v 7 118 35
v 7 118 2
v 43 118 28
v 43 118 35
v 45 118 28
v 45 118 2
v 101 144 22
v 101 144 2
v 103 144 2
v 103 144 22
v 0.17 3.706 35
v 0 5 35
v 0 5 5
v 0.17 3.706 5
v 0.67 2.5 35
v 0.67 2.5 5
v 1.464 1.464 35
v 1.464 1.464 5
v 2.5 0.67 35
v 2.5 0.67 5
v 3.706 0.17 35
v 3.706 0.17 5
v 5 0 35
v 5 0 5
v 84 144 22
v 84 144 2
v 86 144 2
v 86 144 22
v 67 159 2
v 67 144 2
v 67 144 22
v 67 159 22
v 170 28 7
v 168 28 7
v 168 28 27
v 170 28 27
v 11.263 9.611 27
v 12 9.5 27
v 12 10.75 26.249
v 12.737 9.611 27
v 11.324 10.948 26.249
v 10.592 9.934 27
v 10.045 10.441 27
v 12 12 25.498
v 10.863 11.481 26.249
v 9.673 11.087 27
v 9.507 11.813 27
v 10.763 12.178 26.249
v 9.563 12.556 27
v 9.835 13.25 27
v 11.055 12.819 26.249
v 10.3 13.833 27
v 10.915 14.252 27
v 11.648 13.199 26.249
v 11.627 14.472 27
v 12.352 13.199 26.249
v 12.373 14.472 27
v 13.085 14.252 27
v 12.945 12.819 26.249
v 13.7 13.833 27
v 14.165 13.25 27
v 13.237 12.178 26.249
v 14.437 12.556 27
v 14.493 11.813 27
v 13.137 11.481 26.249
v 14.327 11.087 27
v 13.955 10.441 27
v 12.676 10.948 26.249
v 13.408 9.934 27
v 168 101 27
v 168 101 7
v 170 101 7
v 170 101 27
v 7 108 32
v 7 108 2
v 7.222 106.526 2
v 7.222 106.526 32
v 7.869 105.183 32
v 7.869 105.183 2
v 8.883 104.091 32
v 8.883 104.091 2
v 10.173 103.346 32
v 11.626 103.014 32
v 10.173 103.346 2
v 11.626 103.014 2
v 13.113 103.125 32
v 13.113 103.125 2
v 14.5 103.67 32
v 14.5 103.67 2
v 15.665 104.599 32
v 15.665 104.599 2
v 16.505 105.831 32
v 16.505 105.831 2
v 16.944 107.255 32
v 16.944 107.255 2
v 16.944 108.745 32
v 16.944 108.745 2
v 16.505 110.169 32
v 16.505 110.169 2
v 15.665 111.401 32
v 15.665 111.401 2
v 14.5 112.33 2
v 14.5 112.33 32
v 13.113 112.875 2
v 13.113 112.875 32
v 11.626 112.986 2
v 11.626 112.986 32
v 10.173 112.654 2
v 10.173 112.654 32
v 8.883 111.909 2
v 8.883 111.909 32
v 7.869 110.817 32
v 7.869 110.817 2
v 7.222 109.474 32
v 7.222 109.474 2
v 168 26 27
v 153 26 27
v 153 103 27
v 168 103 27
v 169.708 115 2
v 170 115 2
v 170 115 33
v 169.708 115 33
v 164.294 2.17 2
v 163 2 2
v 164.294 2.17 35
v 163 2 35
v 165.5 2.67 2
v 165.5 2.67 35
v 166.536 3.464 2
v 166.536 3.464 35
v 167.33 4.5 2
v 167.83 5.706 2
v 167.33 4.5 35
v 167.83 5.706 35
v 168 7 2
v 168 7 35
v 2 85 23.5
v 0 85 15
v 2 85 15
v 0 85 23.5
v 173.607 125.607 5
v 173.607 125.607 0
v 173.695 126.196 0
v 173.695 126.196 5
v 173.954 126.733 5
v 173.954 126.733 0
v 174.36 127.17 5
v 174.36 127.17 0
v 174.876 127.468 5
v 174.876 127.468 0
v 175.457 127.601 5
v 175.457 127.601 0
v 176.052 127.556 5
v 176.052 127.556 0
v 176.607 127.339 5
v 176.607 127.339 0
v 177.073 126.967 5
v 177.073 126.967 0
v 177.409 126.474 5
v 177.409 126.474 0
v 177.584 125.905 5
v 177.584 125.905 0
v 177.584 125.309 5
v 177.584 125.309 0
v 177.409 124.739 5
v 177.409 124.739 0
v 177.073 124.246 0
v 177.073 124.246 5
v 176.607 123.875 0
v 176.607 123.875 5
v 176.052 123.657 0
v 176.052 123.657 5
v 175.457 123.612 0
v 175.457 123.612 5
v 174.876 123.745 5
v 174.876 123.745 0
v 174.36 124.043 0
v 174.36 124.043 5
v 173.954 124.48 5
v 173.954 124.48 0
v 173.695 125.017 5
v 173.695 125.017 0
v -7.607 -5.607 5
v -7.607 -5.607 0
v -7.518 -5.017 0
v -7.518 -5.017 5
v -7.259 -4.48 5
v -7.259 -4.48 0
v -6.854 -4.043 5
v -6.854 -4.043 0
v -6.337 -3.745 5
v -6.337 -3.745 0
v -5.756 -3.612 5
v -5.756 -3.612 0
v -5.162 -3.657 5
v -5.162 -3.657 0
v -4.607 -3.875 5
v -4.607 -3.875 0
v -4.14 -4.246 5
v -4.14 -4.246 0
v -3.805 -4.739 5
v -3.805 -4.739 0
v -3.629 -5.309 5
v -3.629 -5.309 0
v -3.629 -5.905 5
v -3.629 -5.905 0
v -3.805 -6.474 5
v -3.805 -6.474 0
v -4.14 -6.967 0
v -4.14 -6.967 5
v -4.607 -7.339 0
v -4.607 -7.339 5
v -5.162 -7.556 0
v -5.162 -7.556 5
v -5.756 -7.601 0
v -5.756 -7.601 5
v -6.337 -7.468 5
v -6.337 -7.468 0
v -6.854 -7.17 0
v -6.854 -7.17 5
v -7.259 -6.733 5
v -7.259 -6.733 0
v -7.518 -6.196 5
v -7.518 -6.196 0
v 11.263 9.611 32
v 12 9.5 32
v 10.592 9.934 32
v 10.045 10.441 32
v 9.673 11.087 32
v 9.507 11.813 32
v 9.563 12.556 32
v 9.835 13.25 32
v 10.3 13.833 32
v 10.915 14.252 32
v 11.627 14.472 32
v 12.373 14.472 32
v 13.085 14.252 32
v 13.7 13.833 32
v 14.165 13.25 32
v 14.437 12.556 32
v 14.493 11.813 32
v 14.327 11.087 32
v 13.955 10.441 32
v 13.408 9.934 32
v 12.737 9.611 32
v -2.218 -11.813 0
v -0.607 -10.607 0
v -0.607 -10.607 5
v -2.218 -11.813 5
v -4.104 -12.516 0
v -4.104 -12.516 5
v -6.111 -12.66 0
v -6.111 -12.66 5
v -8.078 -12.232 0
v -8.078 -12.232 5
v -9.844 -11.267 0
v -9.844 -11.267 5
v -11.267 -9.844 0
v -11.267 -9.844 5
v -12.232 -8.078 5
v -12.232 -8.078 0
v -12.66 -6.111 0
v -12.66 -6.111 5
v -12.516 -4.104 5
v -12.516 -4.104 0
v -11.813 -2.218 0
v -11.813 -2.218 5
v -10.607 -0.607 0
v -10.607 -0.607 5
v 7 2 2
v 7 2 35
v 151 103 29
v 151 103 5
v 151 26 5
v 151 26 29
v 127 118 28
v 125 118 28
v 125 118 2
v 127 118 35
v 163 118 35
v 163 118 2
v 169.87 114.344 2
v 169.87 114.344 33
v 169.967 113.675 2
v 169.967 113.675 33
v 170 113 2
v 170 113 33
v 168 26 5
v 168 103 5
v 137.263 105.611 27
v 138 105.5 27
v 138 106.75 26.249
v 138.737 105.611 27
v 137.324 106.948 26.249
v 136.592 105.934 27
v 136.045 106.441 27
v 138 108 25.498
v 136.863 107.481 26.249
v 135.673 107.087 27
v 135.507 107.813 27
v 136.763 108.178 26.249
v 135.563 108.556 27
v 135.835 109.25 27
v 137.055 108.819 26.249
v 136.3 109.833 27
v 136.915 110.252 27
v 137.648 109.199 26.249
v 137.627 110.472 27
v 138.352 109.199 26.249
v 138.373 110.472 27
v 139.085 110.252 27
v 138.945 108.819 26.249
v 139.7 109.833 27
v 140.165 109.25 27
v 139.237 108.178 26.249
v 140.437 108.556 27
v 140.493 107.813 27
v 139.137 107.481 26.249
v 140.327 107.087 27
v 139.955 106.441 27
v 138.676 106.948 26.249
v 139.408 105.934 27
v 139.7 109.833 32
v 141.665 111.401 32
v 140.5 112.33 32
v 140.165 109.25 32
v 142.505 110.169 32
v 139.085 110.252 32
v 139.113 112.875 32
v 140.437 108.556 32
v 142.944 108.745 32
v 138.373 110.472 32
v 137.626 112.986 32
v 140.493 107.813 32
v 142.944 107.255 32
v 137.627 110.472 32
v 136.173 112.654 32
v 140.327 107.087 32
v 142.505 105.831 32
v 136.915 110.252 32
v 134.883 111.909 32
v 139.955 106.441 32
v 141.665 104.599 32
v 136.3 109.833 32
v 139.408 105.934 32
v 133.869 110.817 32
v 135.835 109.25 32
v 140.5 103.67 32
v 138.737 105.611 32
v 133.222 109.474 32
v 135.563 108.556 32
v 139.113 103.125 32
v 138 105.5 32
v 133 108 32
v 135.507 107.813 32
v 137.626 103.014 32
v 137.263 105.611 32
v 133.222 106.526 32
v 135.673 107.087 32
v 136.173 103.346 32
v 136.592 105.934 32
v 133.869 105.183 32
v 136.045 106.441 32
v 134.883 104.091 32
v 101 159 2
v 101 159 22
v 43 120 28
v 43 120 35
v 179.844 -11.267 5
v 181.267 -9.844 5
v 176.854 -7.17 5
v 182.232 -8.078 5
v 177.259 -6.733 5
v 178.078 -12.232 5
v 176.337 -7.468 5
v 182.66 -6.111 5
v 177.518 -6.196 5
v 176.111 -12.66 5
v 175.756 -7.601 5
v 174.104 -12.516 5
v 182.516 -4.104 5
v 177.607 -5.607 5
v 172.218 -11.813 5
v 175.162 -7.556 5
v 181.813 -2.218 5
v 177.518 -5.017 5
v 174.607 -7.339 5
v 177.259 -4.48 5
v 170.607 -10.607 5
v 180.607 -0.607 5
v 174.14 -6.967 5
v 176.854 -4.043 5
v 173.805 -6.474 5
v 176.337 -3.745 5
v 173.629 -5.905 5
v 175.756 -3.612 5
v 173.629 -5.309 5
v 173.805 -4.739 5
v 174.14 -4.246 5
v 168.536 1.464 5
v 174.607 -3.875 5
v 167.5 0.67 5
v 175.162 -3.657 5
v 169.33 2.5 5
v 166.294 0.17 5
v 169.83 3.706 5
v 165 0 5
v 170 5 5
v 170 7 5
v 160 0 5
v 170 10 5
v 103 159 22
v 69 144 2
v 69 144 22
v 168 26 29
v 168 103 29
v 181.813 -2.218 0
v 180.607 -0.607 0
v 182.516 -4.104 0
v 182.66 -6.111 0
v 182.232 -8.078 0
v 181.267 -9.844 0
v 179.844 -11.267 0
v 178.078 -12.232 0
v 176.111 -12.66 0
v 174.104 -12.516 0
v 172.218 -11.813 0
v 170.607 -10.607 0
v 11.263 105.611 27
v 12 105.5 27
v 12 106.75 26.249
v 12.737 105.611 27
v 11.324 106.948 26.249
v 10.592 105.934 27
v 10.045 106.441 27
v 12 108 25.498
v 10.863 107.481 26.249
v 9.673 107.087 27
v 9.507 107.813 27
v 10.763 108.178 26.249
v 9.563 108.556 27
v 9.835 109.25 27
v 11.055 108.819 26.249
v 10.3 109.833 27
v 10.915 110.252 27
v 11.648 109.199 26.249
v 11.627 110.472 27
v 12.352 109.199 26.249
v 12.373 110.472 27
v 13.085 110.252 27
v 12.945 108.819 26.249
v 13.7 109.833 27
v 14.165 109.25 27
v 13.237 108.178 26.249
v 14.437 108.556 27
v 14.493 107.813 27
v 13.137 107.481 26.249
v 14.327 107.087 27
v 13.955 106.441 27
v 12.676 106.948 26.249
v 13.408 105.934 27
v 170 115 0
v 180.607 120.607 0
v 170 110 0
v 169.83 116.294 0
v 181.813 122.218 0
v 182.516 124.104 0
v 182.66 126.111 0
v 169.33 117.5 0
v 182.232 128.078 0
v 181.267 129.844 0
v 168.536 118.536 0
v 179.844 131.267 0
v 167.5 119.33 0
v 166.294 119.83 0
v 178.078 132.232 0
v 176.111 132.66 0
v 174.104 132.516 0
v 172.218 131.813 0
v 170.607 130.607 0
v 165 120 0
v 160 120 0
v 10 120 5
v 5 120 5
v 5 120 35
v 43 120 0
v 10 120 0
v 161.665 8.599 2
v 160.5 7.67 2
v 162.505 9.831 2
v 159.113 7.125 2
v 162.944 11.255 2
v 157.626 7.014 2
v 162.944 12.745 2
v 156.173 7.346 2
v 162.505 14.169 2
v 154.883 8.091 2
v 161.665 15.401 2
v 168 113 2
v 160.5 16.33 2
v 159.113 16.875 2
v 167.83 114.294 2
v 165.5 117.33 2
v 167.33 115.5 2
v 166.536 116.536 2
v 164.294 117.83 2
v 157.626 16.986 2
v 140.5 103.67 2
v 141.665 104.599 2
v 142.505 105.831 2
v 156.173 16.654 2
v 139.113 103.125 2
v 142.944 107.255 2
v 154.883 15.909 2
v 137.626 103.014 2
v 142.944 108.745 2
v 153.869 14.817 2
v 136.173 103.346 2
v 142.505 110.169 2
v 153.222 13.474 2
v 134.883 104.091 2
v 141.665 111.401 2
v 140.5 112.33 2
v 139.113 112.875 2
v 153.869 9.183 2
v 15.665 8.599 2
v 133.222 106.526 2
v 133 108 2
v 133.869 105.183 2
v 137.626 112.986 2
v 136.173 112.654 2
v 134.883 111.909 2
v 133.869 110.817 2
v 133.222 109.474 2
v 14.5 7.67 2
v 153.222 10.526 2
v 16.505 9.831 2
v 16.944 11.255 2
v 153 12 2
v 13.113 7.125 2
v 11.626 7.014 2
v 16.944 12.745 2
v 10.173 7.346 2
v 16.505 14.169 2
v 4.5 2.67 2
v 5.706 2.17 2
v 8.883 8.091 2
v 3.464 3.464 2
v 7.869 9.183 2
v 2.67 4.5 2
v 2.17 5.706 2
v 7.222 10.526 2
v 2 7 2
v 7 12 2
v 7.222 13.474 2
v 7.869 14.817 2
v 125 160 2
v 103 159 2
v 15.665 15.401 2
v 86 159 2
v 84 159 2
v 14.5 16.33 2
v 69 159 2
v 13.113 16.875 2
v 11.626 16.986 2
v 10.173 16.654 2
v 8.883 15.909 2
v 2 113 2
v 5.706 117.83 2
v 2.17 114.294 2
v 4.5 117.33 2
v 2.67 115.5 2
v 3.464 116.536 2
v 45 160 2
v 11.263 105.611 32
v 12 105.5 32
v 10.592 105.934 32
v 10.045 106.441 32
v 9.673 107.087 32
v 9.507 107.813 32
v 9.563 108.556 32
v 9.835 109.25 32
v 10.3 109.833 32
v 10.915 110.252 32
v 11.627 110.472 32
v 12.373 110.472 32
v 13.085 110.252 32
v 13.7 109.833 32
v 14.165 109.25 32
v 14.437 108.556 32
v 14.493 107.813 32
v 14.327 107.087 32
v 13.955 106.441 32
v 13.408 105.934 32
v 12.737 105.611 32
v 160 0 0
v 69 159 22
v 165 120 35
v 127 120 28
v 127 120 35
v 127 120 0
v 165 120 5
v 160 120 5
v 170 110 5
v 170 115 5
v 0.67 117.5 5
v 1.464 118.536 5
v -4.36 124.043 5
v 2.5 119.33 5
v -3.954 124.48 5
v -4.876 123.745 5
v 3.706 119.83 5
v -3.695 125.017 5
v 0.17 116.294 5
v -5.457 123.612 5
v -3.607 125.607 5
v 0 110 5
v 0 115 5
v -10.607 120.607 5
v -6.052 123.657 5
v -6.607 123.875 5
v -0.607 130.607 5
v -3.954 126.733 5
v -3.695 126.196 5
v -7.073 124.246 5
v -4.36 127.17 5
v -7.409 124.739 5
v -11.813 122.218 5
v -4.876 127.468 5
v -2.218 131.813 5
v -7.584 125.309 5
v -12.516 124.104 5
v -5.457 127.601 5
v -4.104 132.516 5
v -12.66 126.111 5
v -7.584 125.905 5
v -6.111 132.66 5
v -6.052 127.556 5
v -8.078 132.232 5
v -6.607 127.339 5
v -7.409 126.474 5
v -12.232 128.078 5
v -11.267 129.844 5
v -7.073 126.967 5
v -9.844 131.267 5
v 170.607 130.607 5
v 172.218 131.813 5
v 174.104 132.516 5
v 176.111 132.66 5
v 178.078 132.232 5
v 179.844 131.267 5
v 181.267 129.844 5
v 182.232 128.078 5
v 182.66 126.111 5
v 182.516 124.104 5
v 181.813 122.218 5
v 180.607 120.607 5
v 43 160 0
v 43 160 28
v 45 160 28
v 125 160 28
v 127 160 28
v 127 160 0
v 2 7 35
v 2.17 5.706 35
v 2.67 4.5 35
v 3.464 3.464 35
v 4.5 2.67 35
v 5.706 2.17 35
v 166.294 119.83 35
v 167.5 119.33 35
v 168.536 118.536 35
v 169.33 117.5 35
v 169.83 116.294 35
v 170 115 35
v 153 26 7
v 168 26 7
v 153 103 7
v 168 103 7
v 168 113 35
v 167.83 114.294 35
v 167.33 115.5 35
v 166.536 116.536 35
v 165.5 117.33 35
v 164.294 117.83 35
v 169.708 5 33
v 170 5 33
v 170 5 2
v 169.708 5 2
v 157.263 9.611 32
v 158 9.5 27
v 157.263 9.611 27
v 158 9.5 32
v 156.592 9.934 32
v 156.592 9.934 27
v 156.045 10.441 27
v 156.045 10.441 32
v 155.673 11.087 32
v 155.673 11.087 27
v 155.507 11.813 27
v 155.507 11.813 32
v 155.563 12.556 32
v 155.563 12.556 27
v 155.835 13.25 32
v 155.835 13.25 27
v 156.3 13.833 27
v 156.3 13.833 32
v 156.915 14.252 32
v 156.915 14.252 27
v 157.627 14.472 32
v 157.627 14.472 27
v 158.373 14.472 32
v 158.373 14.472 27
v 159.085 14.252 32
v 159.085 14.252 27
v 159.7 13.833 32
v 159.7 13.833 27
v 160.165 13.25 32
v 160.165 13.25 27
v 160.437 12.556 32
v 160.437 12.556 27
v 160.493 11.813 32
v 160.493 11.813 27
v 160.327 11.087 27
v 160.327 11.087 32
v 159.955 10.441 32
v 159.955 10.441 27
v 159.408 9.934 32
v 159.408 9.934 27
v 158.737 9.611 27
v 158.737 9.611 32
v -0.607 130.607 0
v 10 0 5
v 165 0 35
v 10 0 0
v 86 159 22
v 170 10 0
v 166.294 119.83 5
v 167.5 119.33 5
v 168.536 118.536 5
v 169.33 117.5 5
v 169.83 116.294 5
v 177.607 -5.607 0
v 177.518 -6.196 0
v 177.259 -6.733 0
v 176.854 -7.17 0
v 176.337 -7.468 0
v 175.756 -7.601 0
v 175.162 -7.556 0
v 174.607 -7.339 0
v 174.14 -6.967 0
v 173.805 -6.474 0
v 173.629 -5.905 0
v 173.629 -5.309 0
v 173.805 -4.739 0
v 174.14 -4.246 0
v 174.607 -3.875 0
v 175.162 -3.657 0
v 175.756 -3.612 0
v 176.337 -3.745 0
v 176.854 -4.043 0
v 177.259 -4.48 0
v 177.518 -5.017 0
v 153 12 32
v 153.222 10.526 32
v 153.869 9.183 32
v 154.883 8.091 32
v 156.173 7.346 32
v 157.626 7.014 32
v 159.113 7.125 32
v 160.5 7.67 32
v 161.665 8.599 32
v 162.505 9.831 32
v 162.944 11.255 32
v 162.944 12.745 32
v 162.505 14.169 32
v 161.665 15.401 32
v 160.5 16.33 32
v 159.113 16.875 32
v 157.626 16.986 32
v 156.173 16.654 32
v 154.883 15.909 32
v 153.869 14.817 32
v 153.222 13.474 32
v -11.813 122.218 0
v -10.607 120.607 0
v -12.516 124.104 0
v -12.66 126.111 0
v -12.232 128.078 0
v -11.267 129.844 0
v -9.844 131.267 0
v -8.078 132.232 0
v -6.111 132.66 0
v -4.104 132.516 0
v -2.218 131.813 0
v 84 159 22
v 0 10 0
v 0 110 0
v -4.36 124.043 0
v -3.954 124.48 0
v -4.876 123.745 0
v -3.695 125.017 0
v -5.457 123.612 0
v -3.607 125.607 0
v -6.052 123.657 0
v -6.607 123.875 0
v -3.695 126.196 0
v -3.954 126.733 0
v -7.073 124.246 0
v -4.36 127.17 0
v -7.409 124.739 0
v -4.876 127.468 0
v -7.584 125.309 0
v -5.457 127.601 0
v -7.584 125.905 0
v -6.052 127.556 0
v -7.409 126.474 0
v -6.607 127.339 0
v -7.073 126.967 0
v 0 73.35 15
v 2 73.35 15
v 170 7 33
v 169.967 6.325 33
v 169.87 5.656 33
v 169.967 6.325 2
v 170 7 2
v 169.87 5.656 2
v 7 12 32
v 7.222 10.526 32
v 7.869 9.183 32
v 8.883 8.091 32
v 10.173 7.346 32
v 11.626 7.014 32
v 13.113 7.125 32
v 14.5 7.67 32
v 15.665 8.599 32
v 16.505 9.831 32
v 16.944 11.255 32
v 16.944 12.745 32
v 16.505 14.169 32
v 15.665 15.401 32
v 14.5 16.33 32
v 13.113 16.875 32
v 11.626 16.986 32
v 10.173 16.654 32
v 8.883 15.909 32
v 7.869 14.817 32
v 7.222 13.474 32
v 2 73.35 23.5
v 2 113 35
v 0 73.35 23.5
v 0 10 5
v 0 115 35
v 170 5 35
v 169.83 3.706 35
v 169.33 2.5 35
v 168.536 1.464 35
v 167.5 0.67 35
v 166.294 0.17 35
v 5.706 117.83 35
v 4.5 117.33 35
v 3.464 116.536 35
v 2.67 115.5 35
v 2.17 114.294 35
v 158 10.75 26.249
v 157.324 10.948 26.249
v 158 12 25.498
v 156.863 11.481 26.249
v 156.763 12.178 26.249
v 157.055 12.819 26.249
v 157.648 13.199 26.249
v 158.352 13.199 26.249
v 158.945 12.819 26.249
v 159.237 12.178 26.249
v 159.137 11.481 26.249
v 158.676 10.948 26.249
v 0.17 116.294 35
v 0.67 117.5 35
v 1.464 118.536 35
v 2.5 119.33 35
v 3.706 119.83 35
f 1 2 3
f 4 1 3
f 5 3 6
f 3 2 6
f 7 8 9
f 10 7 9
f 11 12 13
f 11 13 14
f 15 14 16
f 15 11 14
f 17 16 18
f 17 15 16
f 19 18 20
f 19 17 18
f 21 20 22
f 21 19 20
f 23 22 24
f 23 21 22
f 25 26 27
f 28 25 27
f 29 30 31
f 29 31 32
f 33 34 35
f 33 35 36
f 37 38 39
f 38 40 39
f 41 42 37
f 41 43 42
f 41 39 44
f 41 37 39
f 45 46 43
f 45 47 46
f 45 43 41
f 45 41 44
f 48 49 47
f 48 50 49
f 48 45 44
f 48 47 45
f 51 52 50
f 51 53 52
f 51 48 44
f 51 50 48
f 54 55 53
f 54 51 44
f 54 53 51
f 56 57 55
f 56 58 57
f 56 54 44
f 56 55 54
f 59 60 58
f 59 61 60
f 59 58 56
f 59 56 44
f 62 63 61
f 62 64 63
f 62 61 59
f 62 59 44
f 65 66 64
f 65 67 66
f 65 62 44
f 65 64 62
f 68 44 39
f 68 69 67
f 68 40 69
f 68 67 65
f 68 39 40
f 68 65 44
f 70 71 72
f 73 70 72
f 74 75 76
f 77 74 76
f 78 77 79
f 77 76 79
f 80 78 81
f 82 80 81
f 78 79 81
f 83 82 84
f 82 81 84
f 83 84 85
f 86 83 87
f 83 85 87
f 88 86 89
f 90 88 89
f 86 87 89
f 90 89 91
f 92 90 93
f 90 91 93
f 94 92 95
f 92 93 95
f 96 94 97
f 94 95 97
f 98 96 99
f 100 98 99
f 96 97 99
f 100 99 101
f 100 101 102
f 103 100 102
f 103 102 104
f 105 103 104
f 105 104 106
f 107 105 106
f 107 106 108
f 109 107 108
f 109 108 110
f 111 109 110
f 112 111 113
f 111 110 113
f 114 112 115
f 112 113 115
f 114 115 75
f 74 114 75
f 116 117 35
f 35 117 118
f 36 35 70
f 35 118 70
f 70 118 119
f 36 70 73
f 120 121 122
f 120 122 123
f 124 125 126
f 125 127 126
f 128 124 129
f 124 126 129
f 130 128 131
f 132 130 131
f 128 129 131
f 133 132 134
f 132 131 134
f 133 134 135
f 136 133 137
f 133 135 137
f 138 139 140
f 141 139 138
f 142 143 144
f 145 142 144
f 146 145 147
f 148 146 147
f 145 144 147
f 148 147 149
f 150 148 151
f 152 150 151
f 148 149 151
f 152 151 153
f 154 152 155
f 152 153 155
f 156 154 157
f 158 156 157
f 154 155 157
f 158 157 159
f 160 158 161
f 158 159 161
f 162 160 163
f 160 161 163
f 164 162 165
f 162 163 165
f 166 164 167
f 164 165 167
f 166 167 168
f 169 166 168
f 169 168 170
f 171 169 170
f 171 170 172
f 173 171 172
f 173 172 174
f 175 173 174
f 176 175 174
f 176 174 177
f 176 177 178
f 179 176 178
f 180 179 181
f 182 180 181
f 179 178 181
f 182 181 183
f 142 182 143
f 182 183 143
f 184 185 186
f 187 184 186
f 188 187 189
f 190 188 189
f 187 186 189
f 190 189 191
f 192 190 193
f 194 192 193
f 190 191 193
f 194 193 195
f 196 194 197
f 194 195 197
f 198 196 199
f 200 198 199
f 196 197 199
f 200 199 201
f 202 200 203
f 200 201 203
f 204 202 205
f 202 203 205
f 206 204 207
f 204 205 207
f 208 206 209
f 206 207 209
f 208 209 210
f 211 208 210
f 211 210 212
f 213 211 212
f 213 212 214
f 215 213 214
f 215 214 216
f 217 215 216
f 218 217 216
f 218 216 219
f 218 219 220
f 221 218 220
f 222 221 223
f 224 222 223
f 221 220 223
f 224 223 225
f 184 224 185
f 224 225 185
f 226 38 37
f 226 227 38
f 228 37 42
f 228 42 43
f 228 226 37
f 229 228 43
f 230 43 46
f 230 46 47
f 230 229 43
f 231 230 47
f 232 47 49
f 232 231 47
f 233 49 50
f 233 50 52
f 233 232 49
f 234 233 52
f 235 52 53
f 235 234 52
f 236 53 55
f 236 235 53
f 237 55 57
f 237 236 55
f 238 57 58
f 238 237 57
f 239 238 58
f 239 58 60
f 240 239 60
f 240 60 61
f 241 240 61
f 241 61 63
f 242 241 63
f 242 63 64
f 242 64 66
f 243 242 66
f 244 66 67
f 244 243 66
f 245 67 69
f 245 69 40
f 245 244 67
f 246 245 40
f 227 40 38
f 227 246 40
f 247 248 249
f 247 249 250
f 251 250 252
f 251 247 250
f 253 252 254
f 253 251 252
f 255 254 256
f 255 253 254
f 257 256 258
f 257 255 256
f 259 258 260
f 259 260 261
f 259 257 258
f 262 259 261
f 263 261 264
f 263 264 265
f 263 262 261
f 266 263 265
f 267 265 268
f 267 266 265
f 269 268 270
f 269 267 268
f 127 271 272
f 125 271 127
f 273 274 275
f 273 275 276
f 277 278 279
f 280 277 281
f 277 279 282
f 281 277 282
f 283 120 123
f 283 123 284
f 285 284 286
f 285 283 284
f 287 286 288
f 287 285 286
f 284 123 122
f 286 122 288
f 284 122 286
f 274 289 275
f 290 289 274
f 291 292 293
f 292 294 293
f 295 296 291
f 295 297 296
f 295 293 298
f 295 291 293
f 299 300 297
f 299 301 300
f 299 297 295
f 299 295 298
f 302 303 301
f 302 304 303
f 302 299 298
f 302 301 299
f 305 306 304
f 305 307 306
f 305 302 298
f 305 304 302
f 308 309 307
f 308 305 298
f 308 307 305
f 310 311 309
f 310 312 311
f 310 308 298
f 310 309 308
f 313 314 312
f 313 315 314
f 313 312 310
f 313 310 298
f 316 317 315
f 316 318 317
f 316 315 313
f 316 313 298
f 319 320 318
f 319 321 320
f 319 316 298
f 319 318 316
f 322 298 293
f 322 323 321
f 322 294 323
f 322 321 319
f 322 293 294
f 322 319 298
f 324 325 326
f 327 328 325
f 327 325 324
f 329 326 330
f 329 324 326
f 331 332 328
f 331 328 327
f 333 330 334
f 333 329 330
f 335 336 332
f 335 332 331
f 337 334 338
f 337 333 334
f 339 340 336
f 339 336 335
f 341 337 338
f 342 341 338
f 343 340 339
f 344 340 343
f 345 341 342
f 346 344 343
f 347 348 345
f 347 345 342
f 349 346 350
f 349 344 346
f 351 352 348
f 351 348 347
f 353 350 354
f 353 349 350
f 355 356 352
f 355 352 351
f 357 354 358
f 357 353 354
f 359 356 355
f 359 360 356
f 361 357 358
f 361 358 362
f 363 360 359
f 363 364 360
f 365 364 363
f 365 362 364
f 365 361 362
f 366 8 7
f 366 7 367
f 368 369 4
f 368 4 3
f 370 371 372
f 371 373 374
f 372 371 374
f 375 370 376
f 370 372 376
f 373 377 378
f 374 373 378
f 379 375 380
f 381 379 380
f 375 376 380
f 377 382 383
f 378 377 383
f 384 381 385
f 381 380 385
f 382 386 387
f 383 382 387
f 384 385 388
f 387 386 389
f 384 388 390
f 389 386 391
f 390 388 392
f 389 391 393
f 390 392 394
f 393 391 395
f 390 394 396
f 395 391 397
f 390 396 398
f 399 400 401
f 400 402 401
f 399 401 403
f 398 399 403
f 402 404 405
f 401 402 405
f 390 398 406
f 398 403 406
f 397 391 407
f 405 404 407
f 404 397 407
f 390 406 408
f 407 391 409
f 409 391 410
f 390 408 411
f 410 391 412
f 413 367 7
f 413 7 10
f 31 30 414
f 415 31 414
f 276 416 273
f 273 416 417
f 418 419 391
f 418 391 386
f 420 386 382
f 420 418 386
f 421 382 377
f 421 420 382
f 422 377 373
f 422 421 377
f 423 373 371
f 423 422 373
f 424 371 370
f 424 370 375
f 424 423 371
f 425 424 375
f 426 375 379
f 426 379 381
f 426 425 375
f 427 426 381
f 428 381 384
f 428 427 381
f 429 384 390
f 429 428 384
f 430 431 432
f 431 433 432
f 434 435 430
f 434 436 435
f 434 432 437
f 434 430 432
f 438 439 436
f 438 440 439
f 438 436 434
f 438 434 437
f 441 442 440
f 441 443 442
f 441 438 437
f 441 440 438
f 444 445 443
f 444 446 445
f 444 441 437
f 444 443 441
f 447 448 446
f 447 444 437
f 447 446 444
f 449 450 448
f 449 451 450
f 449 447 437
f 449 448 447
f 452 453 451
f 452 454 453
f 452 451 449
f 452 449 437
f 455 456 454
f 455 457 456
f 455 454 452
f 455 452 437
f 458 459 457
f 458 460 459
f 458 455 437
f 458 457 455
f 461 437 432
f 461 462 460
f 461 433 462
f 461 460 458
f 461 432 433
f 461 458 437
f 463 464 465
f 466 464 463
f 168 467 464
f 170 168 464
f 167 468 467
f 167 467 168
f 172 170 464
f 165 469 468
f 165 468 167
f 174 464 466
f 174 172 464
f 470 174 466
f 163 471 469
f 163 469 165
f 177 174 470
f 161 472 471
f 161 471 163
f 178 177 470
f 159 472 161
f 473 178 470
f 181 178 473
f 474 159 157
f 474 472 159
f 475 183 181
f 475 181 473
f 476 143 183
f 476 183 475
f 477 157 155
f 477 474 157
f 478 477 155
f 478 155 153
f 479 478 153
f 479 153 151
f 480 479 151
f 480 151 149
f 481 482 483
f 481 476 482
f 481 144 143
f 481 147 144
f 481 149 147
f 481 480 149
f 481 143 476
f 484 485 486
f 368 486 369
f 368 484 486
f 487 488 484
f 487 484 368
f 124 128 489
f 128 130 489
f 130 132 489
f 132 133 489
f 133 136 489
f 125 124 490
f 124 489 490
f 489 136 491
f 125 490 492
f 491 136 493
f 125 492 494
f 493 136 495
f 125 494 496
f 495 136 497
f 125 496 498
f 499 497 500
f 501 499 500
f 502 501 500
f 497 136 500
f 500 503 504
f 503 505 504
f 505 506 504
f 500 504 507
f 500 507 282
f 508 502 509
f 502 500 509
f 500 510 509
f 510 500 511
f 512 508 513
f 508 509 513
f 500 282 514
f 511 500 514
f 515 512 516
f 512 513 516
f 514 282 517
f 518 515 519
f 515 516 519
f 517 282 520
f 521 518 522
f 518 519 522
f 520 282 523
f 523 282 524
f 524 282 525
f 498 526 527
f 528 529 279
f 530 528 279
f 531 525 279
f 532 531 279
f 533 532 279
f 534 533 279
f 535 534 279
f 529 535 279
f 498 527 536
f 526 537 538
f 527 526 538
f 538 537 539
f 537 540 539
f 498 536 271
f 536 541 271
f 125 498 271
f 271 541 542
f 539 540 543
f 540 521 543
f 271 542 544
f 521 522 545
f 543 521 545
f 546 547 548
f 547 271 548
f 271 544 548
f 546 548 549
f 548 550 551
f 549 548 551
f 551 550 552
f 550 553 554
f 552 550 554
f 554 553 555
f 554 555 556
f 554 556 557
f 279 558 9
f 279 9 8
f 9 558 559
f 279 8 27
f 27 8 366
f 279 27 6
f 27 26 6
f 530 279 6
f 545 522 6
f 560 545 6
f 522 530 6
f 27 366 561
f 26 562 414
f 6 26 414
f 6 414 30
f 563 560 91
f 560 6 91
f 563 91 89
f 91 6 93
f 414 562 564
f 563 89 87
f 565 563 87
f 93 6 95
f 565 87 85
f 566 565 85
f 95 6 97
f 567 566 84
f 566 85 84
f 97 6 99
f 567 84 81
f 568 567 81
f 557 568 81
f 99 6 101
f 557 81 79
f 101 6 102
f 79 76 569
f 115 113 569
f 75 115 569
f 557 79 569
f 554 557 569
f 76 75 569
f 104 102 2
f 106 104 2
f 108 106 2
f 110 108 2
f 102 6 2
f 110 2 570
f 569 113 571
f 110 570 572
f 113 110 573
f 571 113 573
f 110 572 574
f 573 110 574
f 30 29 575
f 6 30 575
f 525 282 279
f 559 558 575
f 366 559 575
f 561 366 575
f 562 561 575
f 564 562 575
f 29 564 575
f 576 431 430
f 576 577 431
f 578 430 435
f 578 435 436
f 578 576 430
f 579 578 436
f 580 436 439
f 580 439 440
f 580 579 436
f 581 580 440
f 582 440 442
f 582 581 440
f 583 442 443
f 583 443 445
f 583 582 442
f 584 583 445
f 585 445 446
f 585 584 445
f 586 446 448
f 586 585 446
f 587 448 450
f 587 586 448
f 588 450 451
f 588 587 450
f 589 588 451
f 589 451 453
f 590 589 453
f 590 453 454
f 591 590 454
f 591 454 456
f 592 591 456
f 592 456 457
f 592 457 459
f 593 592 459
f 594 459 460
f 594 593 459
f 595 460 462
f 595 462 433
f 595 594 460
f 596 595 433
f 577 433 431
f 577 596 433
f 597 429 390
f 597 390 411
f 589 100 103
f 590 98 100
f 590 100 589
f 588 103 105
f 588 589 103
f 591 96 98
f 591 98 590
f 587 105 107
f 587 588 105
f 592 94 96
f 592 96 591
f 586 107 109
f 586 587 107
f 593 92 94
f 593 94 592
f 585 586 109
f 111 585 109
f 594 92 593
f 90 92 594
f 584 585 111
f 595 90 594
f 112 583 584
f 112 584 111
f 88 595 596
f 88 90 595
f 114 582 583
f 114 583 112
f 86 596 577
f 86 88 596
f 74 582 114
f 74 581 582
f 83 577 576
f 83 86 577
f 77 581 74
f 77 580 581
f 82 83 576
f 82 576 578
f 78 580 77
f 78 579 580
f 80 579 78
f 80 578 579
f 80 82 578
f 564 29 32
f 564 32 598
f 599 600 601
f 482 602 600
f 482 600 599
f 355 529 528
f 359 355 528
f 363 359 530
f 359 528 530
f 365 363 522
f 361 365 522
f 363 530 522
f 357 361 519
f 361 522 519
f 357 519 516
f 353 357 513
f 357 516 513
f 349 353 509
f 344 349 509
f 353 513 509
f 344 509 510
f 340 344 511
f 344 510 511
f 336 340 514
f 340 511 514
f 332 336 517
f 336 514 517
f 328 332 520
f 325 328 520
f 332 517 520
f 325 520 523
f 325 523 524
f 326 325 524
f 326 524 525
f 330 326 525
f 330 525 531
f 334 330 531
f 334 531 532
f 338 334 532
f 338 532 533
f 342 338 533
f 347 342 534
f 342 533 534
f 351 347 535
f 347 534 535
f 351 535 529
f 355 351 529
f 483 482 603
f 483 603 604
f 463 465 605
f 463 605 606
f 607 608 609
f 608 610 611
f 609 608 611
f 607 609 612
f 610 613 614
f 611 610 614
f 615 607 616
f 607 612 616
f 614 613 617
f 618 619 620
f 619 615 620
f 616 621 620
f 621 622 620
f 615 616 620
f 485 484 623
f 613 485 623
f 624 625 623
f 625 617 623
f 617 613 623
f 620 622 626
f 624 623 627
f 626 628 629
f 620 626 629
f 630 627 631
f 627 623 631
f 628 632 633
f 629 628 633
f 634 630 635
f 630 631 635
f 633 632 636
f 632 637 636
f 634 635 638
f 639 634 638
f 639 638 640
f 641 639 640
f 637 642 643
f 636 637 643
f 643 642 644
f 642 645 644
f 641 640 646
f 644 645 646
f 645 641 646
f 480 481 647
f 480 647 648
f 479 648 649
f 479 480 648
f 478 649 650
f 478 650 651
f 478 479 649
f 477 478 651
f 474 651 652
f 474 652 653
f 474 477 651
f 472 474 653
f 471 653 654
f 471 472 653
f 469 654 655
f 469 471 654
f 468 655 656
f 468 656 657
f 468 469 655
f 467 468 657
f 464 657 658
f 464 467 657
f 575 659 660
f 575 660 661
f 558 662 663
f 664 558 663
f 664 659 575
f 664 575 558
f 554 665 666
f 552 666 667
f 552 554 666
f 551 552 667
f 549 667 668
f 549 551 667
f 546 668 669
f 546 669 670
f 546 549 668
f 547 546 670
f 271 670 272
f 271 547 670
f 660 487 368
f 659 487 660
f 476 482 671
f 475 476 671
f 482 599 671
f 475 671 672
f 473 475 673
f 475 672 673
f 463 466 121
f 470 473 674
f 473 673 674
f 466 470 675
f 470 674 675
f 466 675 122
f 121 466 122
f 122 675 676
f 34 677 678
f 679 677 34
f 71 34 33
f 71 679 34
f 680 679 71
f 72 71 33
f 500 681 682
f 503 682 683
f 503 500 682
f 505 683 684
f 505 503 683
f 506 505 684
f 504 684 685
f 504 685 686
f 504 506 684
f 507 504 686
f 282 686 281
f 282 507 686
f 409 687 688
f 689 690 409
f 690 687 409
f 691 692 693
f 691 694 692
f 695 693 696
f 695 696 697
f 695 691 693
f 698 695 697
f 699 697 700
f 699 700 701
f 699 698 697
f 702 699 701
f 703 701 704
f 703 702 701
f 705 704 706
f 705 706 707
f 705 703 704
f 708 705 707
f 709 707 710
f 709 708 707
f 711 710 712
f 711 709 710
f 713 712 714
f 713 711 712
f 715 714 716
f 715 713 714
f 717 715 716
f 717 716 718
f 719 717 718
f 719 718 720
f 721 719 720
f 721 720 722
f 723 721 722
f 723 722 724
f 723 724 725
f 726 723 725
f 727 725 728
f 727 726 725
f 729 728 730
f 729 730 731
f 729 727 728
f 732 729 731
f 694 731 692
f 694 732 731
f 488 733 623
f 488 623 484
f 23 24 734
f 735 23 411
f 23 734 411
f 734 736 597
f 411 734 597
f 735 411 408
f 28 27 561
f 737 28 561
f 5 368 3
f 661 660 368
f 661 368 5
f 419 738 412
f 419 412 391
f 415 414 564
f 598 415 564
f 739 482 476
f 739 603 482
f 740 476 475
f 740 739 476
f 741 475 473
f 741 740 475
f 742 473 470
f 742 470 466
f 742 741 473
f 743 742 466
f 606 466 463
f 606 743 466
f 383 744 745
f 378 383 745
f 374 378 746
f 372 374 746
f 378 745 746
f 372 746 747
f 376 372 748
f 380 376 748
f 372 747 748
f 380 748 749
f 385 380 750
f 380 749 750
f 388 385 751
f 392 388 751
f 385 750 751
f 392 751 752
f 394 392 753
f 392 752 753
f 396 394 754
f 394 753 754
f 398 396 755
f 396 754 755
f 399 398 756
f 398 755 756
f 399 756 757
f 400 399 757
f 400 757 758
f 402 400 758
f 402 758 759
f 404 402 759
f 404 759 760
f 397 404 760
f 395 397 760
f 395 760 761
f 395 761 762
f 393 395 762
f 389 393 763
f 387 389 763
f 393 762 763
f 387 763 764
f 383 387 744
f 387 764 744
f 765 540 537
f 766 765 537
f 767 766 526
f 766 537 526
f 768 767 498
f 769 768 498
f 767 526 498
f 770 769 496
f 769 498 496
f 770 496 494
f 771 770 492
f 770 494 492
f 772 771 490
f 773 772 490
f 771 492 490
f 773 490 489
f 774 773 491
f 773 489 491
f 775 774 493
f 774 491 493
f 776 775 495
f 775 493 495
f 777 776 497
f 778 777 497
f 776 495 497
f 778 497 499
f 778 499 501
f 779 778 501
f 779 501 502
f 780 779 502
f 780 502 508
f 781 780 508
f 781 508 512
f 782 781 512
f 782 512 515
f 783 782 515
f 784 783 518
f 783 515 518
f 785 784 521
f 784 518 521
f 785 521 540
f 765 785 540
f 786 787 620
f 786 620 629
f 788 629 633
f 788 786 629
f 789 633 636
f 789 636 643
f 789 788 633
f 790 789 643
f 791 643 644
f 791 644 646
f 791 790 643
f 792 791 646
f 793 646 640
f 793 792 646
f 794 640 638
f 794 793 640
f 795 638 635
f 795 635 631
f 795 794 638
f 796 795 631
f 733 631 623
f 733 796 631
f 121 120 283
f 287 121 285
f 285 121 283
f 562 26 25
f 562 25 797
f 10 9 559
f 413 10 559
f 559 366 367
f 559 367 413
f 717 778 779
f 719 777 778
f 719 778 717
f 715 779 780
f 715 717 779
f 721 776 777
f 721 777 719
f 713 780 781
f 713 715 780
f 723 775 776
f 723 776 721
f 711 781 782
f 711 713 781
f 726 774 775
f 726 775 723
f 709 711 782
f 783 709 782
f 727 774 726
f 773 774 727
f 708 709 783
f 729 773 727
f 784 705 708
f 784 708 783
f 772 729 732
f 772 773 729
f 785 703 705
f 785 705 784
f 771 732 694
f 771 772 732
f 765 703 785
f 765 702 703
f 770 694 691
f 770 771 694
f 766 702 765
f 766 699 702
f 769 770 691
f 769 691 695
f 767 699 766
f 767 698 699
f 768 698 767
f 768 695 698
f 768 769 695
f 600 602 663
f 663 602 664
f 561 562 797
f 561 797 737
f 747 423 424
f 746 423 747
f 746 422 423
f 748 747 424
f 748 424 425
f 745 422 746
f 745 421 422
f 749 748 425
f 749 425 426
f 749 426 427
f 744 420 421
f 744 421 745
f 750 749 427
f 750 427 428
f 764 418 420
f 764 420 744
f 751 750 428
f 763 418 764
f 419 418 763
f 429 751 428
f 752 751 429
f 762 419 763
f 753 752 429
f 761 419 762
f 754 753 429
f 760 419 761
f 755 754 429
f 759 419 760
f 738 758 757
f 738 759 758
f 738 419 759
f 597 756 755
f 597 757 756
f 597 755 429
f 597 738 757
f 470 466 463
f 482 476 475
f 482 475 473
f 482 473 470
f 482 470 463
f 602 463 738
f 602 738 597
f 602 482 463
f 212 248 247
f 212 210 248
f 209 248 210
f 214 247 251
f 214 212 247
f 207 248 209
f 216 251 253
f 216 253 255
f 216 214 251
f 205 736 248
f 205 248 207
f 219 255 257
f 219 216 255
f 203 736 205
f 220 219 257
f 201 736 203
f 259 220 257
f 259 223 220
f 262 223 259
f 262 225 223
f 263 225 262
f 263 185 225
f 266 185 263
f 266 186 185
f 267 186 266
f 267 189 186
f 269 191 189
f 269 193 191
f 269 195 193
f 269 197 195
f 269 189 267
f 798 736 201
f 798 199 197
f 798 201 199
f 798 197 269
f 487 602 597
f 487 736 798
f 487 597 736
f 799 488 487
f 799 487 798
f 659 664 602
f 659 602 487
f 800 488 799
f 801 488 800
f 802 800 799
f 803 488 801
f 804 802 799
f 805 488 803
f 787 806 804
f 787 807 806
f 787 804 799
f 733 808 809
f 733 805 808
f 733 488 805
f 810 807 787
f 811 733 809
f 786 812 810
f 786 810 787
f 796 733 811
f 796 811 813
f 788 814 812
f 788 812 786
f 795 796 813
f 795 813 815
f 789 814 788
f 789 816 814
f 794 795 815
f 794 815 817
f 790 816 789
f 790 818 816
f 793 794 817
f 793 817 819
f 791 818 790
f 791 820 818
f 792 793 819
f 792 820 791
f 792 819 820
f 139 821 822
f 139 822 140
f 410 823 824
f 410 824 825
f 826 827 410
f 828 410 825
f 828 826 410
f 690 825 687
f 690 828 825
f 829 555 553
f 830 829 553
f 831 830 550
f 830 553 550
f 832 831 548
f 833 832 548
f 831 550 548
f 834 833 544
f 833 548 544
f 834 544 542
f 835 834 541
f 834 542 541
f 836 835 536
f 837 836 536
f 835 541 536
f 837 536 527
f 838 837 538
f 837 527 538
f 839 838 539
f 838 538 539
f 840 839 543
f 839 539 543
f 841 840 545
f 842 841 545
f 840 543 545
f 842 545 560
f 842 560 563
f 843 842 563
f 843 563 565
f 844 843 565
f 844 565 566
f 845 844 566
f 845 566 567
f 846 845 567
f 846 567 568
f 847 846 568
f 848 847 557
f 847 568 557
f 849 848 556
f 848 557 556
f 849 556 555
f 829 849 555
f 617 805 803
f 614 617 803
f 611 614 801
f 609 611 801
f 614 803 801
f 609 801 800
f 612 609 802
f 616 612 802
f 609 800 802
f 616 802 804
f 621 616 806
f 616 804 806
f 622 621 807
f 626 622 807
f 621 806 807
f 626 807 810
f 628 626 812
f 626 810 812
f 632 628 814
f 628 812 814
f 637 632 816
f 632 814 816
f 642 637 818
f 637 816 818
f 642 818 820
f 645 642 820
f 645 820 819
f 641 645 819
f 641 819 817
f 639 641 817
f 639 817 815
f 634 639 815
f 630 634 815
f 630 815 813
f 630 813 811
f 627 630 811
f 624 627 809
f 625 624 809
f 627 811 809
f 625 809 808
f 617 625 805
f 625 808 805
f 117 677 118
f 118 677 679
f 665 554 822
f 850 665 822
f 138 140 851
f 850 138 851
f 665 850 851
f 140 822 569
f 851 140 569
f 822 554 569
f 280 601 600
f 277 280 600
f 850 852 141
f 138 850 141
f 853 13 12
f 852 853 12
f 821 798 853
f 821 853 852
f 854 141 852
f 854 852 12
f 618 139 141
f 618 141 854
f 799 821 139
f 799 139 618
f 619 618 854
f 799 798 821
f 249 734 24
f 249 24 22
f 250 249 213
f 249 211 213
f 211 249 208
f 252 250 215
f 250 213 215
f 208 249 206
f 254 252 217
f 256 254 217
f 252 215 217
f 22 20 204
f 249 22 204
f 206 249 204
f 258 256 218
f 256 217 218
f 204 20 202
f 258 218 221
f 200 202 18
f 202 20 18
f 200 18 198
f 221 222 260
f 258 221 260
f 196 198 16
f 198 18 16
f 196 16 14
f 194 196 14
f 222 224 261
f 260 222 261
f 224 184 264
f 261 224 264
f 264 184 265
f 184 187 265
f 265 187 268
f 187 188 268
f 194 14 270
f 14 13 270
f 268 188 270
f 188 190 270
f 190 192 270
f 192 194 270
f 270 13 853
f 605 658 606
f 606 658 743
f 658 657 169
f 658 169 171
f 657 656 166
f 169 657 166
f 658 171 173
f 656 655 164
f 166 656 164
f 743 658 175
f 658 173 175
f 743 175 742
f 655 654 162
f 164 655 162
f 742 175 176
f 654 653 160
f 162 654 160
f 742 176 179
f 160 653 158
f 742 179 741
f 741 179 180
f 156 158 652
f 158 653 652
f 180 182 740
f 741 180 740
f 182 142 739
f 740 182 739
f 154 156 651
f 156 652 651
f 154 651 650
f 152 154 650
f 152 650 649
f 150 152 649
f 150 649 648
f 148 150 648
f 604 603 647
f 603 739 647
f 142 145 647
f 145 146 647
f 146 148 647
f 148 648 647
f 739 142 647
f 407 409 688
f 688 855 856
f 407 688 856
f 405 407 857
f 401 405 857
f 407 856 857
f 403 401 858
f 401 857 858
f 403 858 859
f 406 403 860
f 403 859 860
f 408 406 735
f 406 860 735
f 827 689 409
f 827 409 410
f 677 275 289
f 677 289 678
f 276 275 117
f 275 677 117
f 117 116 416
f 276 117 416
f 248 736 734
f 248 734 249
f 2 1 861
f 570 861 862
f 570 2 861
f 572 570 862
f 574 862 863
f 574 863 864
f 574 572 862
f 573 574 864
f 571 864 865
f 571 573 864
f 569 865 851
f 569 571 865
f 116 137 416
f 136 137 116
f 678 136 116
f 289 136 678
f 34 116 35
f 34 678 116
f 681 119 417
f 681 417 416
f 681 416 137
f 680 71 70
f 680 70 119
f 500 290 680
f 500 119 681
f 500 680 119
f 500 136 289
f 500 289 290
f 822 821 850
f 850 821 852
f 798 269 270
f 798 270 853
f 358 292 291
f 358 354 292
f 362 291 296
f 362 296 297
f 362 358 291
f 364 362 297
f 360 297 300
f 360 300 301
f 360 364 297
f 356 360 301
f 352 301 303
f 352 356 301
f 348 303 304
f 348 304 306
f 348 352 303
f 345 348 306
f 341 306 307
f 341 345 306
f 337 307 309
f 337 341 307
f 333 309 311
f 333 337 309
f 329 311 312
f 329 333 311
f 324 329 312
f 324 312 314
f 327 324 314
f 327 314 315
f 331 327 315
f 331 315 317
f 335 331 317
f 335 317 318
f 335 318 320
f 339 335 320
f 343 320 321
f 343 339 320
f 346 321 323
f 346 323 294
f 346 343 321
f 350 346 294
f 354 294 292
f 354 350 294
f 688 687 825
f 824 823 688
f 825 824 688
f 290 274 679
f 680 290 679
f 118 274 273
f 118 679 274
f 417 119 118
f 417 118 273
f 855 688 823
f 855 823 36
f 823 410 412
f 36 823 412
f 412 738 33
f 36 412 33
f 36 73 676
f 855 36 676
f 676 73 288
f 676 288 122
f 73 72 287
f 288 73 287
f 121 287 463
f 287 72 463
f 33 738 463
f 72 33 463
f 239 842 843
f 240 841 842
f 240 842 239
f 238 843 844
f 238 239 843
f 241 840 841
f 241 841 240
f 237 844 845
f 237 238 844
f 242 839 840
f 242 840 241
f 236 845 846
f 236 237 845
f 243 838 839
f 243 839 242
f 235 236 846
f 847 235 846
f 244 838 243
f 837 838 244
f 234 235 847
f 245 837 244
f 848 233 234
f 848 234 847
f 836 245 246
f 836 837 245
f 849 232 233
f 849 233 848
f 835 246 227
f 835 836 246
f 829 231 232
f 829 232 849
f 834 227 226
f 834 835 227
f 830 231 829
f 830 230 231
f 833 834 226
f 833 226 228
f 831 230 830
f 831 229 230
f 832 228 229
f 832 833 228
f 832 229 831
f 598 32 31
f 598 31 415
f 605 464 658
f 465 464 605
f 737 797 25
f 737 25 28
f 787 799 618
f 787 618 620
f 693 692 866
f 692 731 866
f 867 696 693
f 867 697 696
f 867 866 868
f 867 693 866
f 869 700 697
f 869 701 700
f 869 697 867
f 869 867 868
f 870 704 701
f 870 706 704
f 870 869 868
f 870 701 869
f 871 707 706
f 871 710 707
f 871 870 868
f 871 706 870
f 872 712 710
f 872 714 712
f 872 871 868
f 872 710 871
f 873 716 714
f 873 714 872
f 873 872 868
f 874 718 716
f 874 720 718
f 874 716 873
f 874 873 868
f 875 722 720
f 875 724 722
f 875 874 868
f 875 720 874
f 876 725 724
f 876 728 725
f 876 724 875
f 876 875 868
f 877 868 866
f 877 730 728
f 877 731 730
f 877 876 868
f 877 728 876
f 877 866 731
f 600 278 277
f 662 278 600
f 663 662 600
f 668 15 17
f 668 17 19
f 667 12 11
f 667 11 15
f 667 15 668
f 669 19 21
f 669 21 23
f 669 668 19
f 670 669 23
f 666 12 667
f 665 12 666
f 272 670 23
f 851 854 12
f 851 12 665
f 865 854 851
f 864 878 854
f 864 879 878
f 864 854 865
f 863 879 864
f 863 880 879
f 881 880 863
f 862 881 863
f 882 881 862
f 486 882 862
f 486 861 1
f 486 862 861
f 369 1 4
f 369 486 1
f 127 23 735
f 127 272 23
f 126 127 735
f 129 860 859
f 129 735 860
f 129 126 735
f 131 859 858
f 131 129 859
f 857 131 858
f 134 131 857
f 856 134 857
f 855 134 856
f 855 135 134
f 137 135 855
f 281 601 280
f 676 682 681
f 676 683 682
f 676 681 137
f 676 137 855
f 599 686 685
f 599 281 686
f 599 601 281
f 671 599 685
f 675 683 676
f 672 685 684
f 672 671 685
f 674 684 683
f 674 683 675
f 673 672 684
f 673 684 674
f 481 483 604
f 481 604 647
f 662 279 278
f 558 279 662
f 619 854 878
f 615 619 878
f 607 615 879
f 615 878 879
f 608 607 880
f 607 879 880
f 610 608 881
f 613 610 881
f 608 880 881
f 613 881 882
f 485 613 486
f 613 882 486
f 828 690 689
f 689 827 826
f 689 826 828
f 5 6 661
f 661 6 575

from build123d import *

# Parameters (mm, degrees)
SKETCH1_W                      = 170
SKETCH1_H                      = 120
BOSS_EXTRUDE1_DEPTH            = 35
SHELL1_T                       = -2
SKETCH2_R                      = 2
BOSS_EXTRUDE2_DEPTH            = 5
BOSS_EXTRUDE2_2_DEPTH          = 5
BOSS_EXTRUDE2_3_DEPTH          = 5
BOSS_EXTRUDE2_4_DEPTH          = 5
SKETCH3_W                      = 8.5
SKETCH3_H                      = 11.65
CUT_EXTRUDE1_DEPTH             = 168
SKETCH4_W                      = 84
SKETCH4_H                      = 33
CUT_EXTRUDE2_DEPTH             = 118
FILLET1_R                      = 5
FILLET2_R                      = 5
SKETCH5_W                      = 84
SKETCH5_H                      = 40
BOSS_EXTRUDE3_DEPTH            = 2
FILLET3_R                      = 5
FILLET4_R                      = 5
FILLET5_R                      = 5
FILLET6_R                      = 5
SKETCH9_W                      = 2
SKETCH9_H                      = 15
BOSS_EXTRUDE4_DEPTH            = 20
SKETCH10_W                     = 2
SKETCH10_H                     = 42
BOSS_EXTRUDE5_DEPTH            = 26
SKETCH13_W                     = 24
SKETCH13_H                     = 77
BOSS_EXTRUDE7_DEPTH            = 17
SHELL2_START                   = 7
SHELL2_OUTLINE_W               = 17
SHELL2_OUTLINE_H               = 73
SHELL2_DEPTH                   = 20
SHELL2_START_2                 = 2
SHELL2_2_DEPTH                 = 31
SKETCH14_W                     = 15
SKETCH14_H                     = 20
CUT_EXTRUDE4_DEPTH             = 5
SKETCH15_W                     = 15
SKETCH15_H                     = 20
CUT_EXTRUDE5_DEPTH             = 5
SKETCH21_R                     = 5
BOSS_EXTRUDE8_DEPTH            = 30
F_5_0MM_DOWEL_HOLE2_AT_2_COUNT = 2
F_5_0MM_DOWEL_HOLE2_AT_2_PITCH = 158.404545389


# Read off the part's stored shape, not the designer's step: Shell2
with BuildPart() as part:
    # Sketch1 → Boss-Extrude1 (new body)
    with BuildSketch(Plane.XY):
        with Locations((85, 60)):
            Rectangle(SKETCH1_W, SKETCH1_H)
    extrude(amount=BOSS_EXTRUDE1_DEPTH)

    # Shell1
    shell1_openings = [part.faces().sort_by_distance(p)[0] for p in [
        (85, 60, 35),
    ]]
    offset(amount=SHELL1_T, openings=shell1_openings, kind=Kind.INTERSECTION)

    # Sketch3 → Cut-Extrude1 (cut)
    with BuildSketch(Plane.ZY):
        with Locations((19.25, 79.175)):
            Rectangle(SKETCH3_W, SKETCH3_H)
    extrude(amount=-CUT_EXTRUDE1_DEPTH, mode=Mode.SUBTRACT)

    # Sketch4 → Cut-Extrude2 (cut)
    with BuildSketch(Plane(origin=(0, 120, 0), x_dir=(1, 0, 0), z_dir=(0, 1, 0))):
        with Locations((85, -18.5)):
            Rectangle(SKETCH4_W, SKETCH4_H)
    extrude(amount=-CUT_EXTRUDE2_DEPTH, mode=Mode.SUBTRACT)

    # Fillet1
    fillet1_edges = [part.edges().sort_by_distance(p)[0] for p in [
        (0, 120, 17.5),
        (170, 120, 17.5),
        (170, 0, 17.5),
        (0, 0, 17.5),
    ]]
    fillet(fillet1_edges, radius=FILLET1_R)

    # Fillet2
    fillet2_edges = [part.edges().sort_by_distance(p)[0] for p in [
        (2, 118, 18.5),
        (2, 2, 18.5),
        (168, 2, 18.5),
        (168, 118, 18.5),
    ]]
    fillet(fillet2_edges, radius=FILLET2_R)

    # Sketch5 → Boss-Extrude3 (add)
    with BuildSketch(Plane(origin=(0, 0, 0), x_dir=(-1, 0, 0), z_dir=(0, 0, -1))):
        with Locations((-85, 140)):
            Rectangle(SKETCH5_W, SKETCH5_H)
    extrude(amount=-BOSS_EXTRUDE3_DEPTH)

    # Sketch9 → Boss-Extrude4 (add)
    with BuildSketch(Plane.XY.offset(2)):
        with Locations((68, 151.5)):
            Rectangle(SKETCH9_W, SKETCH9_H)
        with Locations((85, 151.5)):
            Rectangle(SKETCH9_W, SKETCH9_H)
        with Locations((102, 151.5)):
            Rectangle(SKETCH9_W, SKETCH9_H)
    extrude(amount=BOSS_EXTRUDE4_DEPTH)

    # Sketch10 → Boss-Extrude5 (add)
    with BuildSketch(Plane.XY.offset(2)):
        with Locations((44, 139)):
            Rectangle(SKETCH10_W, SKETCH10_H)
        with Locations((126, 139)):
            Rectangle(SKETCH10_W, SKETCH10_H)
    extrude(amount=BOSS_EXTRUDE5_DEPTH)

    # Sketch13 → Boss-Extrude7 (add)
    with BuildSketch(Plane.ZY.offset(-168)):
        with Locations((17, 64.5)):
            Rectangle(SKETCH13_W, SKETCH13_H)
    extrude(amount=BOSS_EXTRUDE7_DEPTH)

    # Shell2 outline → Shell2 (cut)
    with BuildSketch(Plane.XY.offset(SHELL2_START)):
        with Locations((161.5, 64.5)):
            Rectangle(SHELL2_OUTLINE_W, SHELL2_OUTLINE_H)
        with BuildLine():
            ThreePointArc((169.708203932, 115), (169.926666858, 114.010587075), (170, 113))
            Line((170, 113), (170, 115))
            Line((170, 115), (169.708203932, 115))
        make_face()
        with BuildLine():
            Line((170, 5), (170, 7))
            ThreePointArc((170, 7), (169.926666858, 5.989412925), (169.708203932, 5))
            Line((169.708203932, 5), (170, 5))
        make_face()
    extrude(amount=SHELL2_DEPTH, mode=Mode.SUBTRACT)

    # Shell2 2 outline → Shell2 2 (cut)
    with BuildSketch(Plane.XY.offset(SHELL2_START_2)):
        with BuildLine():
            ThreePointArc((169.708203932, 115), (169.926666858, 114.010587075), (170, 113))
            Line((170, 113), (170, 115))
            Line((170, 115), (169.708203932, 115))
        make_face()
        with BuildLine():
            Line((170, 5), (170, 7))
            ThreePointArc((170, 7), (169.926666858, 5.989412925), (169.708203932, 5))
            Line((169.708203932, 5), (170, 5))
        make_face()
    extrude(amount=SHELL2_2_DEPTH, mode=Mode.SUBTRACT)

    # Sketch14 → Cut-Extrude4 (cut)
    with BuildSketch(Plane.XZ.offset(-101)):
        with Locations((160.5, 17)):
            Rectangle(SKETCH14_W, SKETCH14_H)
    extrude(amount=-CUT_EXTRUDE4_DEPTH, mode=Mode.SUBTRACT)

    # Sketch15 → Cut-Extrude5 (cut)
    with BuildSketch(Plane(origin=(0, 28, 0), x_dir=(1, 0, 0), z_dir=(0, 1, 0))):
        with Locations((160.5, -17)):
            Rectangle(SKETCH15_W, SKETCH15_H)
    extrude(amount=-CUT_EXTRUDE5_DEPTH, mode=Mode.SUBTRACT)


with BuildPart() as body_2:
    # Sketch2 → Boss-Extrude2 (new body)
    with BuildSketch(Plane(origin=(0, 0, 0), x_dir=(-1, 0, 0), z_dir=(0, 0, -1))):
        with BuildLine():
            Line((-160, 120), (-170.606601718, 130.606601718))
            ThreePointArc((-170.606601718, 130.606601718), (-180.606601718, 130.606601718), (-180.606601718, 120.606601718))
            Line((-180.606601718, 120.606601718), (-170, 110))
            Line((-170, 110), (-170, 120))
            Line((-170, 120), (-160, 120))
        make_face()
        with Locations((-175.606601718, 125.606601718)):
            Circle(SKETCH2_R, mode=Mode.SUBTRACT)
    extrude(amount=-BOSS_EXTRUDE2_DEPTH)

    # Fillet3
    fillet3_edges = [body_2.edges().sort_by_distance(p)[0] for p in [
        (170, 120, 2.5),
    ]]
    fillet(fillet3_edges, radius=FILLET3_R)


with BuildPart() as body_3:
    # Sketch2 → Boss-Extrude2 2 (new body)
    with BuildSketch(Plane(origin=(0, 0, 0), x_dir=(-1, 0, 0), z_dir=(0, 0, -1))):
        with BuildLine():
            Line((0, 110), (10.606601718, 120.606601718))
            ThreePointArc((10.606601718, 120.606601718), (10.606601718, 130.606601718), (0.606601718, 130.606601718))
            Line((0.606601718, 130.606601718), (-10, 120))
            Line((-10, 120), (0, 120))
            Line((0, 120), (0, 110))
        make_face()
        with Locations(Location((5.606601718, 125.606601718, 0), (0, 0, 180))):
            Circle(SKETCH2_R, mode=Mode.SUBTRACT)
    extrude(amount=-BOSS_EXTRUDE2_2_DEPTH)

    # Fillet4
    fillet4_edges = [body_3.edges().sort_by_distance(p)[0] for p in [
        (0, 120, 2.5),
    ]]
    fillet(fillet4_edges, radius=FILLET4_R)


    add(part.part)  # Boss-Extrude8 merges part


with BuildPart() as body_4:
    # Sketch2 → Boss-Extrude2 3 (new body)
    with BuildSketch(Plane(origin=(0, 0, 0), x_dir=(-1, 0, 0), z_dir=(0, 0, -1))):
        with BuildLine():
            Line((-10, 0), (0.606601718, -10.606601718))
            ThreePointArc((0.606601718, -10.606601718), (10.606601718, -10.606601718), (10.606601718, -0.606601718))
            Line((10.606601718, -0.606601718), (0, 10))
            Line((0, 10), (0, 0))
            Line((0, 0), (-10, 0))
        make_face()
        with Locations((5.606601718, -5.606601718)):
            Circle(SKETCH2_R, mode=Mode.SUBTRACT)
    extrude(amount=-BOSS_EXTRUDE2_3_DEPTH)

    # Fillet5
    fillet5_edges = [body_4.edges().sort_by_distance(p)[0] for p in [
        (0, 0, 2.5),
    ]]
    fillet(fillet5_edges, radius=FILLET5_R)


with BuildPart() as body_5:
    # Sketch2 → Boss-Extrude2 4 (new body)
    with BuildSketch(Plane(origin=(0, 0, 0), x_dir=(-1, 0, 0), z_dir=(0, 0, -1))):
        with BuildLine():
            Line((-170, 10), (-180.606601718, -0.606601718))
            ThreePointArc((-180.606601718, -0.606601718), (-180.606601718, -10.606601718), (-170.606601718, -10.606601718))
            Line((-170.606601718, -10.606601718), (-160, 0))
            Line((-160, 0), (-170, 0))
            Line((-170, 0), (-170, 10))
        make_face()
        with Locations(Location((-175.606601718, -5.606601718, 0), (0, 0, 180))):
            Circle(SKETCH2_R, mode=Mode.SUBTRACT)
    extrude(amount=-BOSS_EXTRUDE2_4_DEPTH)

    # Fillet6
    fillet6_edges = [body_5.edges().sort_by_distance(p)[0] for p in [
        (170, 0, 2.5),
    ]]
    fillet(fillet6_edges, radius=FILLET6_R)


with BuildPart() as body_3_1:
    add(body_3.part)

    add(body_4.part)  # Boss-Extrude8 merges body 4

    add(body_5.part)  # Boss-Extrude8 merges body 5
    # Sketch21 → Boss-Extrude8 (add)
    with BuildSketch(Plane.XY.offset(2)):
        with Locations(Location((12, 108, 0), (0, 0, 180))):
            Circle(SKETCH21_R)
        with Locations(Location((138, 108, 0), (0, 0, 180))):
            Circle(SKETCH21_R)
        with Locations(Location((12, 12, 0), (0, 0, 180))):
            Circle(SKETCH21_R)
        with Locations(Location((158, 12, 0), (0, 0, 180))):
            Circle(SKETCH21_R)
    extrude(amount=BOSS_EXTRUDE8_DEPTH)

    # Sketch28 → Ø5.0mm Dowel Hole2 (revolve, cut)
    with BuildSketch(Plane(origin=(138, 108, 32), x_dir=(0, -1, 0), z_dir=(1, 0, 0))):
        Polygon((0, 0), (0, 6.502151548), (2.5, 5), (2.5, 0), align=None)
    f_5_0mm_dowel_hole2 = revolve(axis=Axis((138, 108, 38.35), (0, 0, -1)), mode=Mode.SUBTRACT)

    # Ø5.0mm Dowel Hole2 at 2: Ø5.0mm Dowel Hole2 ×2
    with Locations(*[Vector(-0.7954317200324987, -0.6060432152628561, 0) * (i * F_5_0MM_DOWEL_HOLE2_AT_2_PITCH) for i in range(1, F_5_0MM_DOWEL_HOLE2_AT_2_COUNT)]):
        add(f_5_0mm_dowel_hole2, mode=Mode.SUBTRACT)

    # Sketch30 → Ø5.0mm Dowel Hole4 (revolve, cut)
    with BuildSketch(Plane(origin=(12, 108, 32), x_dir=(0, -1, 0), z_dir=(1, 0, 0))):
        Polygon((0, 0), (0, 6.502151548), (2.5, 5), (2.5, 0), align=None)
    revolve(axis=Axis((12, 108, 38.35), (0, 0, -1)), mode=Mode.SUBTRACT)

    # Sketch31 → Ø5.0mm Dowel Hole5 (revolve, cut)
    with BuildSketch(Plane(origin=(158, 12, 32), x_dir=(0, -1, 0), z_dir=(1, 0, 0))):
        Polygon((0, 0), (0, 6.502151548), (2.5, 5), (2.5, 0), align=None)
    revolve(axis=Axis((158, 12, 38.35), (0, 0, -1)), mode=Mode.SUBTRACT)


solid = Compound([body_2.part, body_3_1.part])
